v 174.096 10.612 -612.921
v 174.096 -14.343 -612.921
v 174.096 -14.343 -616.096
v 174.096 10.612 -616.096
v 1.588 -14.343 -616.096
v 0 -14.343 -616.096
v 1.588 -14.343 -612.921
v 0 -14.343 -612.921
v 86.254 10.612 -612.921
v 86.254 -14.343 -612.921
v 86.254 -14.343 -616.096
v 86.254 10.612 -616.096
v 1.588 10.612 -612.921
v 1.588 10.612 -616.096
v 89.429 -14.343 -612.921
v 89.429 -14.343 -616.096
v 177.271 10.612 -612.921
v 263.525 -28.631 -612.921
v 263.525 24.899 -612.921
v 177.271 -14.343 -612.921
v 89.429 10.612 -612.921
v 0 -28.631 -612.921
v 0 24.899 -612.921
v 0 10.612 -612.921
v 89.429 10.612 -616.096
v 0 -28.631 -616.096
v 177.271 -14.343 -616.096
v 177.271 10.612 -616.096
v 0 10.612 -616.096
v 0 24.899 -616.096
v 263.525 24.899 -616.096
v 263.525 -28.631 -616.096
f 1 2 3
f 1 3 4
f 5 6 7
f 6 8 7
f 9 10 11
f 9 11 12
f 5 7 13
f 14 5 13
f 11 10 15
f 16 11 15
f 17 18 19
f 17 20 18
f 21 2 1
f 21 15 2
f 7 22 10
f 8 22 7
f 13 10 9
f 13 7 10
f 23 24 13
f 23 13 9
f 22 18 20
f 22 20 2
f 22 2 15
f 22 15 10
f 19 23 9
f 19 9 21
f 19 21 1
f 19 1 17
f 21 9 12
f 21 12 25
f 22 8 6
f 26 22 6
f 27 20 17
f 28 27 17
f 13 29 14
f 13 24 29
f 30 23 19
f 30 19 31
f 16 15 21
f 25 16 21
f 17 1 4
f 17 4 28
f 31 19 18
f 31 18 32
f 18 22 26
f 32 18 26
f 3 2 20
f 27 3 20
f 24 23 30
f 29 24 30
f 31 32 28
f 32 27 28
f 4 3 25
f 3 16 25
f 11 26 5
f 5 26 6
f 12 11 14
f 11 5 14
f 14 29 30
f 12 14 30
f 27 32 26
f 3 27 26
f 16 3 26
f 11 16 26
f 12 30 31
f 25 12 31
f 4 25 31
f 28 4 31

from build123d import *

# Parameters (mm, degrees)
SKETCH1_W           = 3.175
SKETCH1_H           = 53.530097244
BOSS_EXTRUDE1_DEPTH = 263.525
SKETCH5_W           = 3.175
SKETCH5_H           = 24.955097244
CUT_EXTRUDE1_DEPTH  = 266.094755278
LPATTERN1_COUNT     = 4
LPATTERN1_PITCH     = 87.841666667


with BuildPart() as part:
    # Sketch1 → Boss-Extrude1 (new body)
    with BuildSketch(Plane(origin=(0, 0, 0), x_dir=(0, 0, -1), z_dir=(1, 0, 0))):
        with Locations((614.508553399, -1.865756921)):
            Rectangle(SKETCH1_W, SKETCH1_H)
    extrude(amount=BOSS_EXTRUDE1_DEPTH)

    # Sketch5 → Cut-Extrude1 (cut, symmetric)
    with BuildSketch(Plane.XY.offset(-612.921053399)):
        with Locations((0, -1.865756921)):
            Rectangle(SKETCH5_W, SKETCH5_H)
    cut_extrude1 = extrude(amount=CUT_EXTRUDE1_DEPTH, both=True, mode=Mode.SUBTRACT)

    # LPattern1: Cut-Extrude1 ×4, 1 skipped
    with Locations(*[(i * LPATTERN1_PITCH, 0, 0) for i in range(1, LPATTERN1_COUNT) if i not in (3,)]):
        add(cut_extrude1, mode=Mode.SUBTRACT)


solid = part.part
